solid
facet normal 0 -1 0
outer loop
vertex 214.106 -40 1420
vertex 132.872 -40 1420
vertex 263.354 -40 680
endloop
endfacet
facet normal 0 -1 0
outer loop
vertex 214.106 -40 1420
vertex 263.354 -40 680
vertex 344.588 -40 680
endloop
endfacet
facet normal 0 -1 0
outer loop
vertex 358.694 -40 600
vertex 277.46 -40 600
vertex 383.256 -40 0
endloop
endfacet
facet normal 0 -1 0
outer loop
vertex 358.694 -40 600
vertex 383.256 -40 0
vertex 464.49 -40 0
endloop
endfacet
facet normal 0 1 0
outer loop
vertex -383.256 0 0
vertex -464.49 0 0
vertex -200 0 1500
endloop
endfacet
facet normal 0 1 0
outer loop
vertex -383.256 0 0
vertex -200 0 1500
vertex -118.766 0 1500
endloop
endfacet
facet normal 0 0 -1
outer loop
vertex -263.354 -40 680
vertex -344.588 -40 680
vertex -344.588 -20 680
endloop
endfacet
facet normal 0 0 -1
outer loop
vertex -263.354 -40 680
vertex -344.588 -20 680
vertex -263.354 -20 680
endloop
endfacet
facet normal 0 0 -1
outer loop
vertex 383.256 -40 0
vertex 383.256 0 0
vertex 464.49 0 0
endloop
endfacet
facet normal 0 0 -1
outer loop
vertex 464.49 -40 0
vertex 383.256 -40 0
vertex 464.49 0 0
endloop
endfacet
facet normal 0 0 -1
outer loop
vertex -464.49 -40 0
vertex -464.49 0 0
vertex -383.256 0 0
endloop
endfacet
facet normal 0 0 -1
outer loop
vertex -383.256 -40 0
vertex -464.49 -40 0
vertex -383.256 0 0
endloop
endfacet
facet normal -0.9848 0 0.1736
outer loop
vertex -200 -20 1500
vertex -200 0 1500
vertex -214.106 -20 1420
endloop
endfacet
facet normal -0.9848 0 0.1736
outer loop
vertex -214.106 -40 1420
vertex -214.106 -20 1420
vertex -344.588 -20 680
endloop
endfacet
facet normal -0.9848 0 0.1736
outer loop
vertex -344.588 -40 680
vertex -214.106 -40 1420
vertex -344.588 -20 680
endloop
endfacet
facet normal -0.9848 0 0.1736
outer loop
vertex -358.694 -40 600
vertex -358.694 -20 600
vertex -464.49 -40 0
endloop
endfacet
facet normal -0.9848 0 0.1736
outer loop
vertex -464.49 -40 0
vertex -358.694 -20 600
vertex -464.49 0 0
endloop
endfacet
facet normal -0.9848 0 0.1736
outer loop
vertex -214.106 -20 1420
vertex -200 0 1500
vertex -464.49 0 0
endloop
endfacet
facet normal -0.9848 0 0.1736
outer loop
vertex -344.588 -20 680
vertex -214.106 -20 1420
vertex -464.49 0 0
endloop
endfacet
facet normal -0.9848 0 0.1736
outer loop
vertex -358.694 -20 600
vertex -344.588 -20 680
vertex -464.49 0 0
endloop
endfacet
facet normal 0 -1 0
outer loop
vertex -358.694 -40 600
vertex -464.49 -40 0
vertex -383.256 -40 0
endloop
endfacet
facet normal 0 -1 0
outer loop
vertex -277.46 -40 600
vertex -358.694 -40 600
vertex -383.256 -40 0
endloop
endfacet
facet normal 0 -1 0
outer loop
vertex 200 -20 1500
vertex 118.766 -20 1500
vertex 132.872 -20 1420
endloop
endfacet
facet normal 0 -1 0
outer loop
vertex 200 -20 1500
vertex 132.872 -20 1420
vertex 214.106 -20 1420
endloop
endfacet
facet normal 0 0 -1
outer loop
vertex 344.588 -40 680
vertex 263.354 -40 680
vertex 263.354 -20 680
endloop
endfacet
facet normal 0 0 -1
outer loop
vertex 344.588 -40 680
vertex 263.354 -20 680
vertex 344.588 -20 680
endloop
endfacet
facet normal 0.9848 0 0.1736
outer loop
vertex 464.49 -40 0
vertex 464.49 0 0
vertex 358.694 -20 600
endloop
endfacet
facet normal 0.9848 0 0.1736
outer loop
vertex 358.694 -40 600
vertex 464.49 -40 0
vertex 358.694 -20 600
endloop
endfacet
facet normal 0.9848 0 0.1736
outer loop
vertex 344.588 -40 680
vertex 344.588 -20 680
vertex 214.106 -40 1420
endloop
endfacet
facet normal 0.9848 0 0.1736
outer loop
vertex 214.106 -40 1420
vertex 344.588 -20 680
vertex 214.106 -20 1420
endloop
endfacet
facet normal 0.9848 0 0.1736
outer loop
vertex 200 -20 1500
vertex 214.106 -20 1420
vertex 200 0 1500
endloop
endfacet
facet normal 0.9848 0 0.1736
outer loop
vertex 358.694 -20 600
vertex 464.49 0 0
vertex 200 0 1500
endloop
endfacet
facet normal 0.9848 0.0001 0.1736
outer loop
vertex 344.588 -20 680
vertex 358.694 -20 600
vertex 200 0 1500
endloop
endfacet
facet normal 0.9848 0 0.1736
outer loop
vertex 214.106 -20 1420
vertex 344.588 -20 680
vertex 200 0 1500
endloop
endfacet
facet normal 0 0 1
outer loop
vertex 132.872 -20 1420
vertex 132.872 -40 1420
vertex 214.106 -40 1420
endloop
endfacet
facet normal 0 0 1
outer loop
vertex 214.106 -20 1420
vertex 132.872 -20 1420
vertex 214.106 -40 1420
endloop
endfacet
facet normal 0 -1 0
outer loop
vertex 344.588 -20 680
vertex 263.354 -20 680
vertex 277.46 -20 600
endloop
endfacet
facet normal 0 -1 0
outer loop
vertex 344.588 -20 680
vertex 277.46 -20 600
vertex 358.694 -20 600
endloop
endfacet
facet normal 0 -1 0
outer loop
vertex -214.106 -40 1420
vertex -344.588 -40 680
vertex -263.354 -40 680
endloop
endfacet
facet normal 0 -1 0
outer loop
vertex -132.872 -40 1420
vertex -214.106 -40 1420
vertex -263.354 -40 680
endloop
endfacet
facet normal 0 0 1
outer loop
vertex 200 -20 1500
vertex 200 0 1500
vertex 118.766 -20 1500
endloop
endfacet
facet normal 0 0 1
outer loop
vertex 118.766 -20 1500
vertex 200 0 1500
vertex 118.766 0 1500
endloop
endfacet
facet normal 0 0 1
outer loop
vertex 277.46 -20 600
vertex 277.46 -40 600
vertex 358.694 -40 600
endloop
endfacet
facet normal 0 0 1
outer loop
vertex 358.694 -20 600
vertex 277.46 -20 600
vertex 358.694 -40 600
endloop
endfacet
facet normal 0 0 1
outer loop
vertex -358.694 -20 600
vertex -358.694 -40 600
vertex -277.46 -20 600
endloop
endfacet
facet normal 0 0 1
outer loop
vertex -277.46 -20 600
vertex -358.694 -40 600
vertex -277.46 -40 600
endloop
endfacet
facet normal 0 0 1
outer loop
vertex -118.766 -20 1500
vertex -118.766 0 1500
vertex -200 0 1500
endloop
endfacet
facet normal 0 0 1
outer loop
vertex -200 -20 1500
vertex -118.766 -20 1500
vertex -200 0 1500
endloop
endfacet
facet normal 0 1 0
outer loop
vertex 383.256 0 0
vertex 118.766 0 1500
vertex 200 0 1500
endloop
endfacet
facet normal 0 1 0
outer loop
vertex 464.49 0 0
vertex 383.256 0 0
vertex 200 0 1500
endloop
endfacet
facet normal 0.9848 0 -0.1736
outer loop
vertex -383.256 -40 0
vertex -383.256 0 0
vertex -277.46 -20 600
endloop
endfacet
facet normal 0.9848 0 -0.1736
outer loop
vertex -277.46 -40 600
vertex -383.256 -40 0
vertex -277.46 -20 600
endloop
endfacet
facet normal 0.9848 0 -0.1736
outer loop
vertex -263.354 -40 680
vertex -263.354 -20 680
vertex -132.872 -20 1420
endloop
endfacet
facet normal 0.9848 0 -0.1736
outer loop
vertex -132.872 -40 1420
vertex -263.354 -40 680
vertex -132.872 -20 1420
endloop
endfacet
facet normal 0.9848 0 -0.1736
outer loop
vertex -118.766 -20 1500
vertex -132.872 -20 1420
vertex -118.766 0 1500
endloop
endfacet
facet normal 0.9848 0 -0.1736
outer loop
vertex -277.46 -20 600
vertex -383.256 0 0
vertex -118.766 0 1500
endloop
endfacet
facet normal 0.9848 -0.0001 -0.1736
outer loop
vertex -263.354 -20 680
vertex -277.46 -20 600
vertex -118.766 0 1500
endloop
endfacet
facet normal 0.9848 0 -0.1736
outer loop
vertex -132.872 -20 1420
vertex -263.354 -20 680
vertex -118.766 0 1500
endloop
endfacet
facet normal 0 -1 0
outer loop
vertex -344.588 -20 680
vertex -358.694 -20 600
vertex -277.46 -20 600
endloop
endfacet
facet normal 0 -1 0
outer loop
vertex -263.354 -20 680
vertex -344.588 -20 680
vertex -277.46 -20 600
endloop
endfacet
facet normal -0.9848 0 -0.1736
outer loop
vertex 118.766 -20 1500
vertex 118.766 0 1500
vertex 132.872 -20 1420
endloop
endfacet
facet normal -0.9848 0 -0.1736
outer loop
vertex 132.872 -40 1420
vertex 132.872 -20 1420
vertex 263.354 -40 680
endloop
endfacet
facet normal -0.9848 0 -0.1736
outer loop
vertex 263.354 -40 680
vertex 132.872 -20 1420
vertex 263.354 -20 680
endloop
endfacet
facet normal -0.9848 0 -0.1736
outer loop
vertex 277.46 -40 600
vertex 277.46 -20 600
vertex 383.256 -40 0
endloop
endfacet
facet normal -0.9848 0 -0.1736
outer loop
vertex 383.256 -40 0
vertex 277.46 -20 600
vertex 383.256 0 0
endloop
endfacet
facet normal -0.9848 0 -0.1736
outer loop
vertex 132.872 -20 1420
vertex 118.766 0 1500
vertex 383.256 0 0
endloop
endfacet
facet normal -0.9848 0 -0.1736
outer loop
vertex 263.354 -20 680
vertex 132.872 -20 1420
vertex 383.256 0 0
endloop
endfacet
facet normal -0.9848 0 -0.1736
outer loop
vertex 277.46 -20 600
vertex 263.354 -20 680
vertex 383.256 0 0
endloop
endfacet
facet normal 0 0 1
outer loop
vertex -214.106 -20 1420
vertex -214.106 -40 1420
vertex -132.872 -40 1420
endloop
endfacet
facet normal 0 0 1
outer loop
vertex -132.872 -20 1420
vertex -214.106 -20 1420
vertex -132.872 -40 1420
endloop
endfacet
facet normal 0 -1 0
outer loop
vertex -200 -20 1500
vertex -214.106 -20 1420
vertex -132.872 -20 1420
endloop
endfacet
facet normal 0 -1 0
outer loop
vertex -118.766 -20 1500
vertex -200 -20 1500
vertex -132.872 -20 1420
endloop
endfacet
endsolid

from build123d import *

# Parameters (mm, degrees)
F2_DEPTH = 40
F3_W     = 95.3402874075
F3_H     = 80
F4_DEPTH = 20
F5_DEPTH = 20
F6_W     = 95.3402874075
F6_H     = 80
F7_DEPTH = 20


with BuildPart() as f2:
    # F1 (on Front) → F2 (new body)
    with BuildSketch(Plane.XZ):
        Polygon((-118.7658710491, 1500), (-200, 1500), (-464.4904710627, 0), (-383.2563421118, 0), align=None)
    extrude(amount=F2_DEPTH)

    # F3 (on face) → F4 (cut)
    with BuildSketch(Plane.XZ.offset(40)):
        Polygon((-118.7658710491, 1500), (-200, 1500), (-214.1061584567, 1420), (-132.8720295058, 1420), align=None)
        with Locations((-311.0241389339, 640)):
            Rectangle(F3_W, F3_H)
    extrude(amount=-F4_DEPTH, mode=Mode.SUBTRACT)

    # F3 (on face) → F5 (cut)
    with BuildSketch(Plane.XZ.offset(40)):
        Polygon((-118.7658710491, 1500), (-200, 1500), (-214.1061584567, 1420), (-132.8720295058, 1420), align=None)
        with Locations((-311.0241389339, 640)):
            Rectangle(F3_W, F3_H)
    extrude(amount=-F5_DEPTH, mode=Mode.SUBTRACT)


with BuildPart() as f2b:
    # F1 (on Front) → F2, piece 2 (new body)
    with BuildSketch(Plane.XZ):
        Polygon((118.7658710491, 1500), (383.2563421118, 0), (464.4904710627, 0), (200, 1500), align=None)
    extrude(amount=F2_DEPTH)

    # F6 (on face) → F7 (cut)
    with BuildSketch(Plane.XZ.offset(40)):
        with Locations((166.4360147529, 1460)):
            Rectangle(F6_W, F6_H)
        with Locations((311.0241389339, 640)):
            Rectangle(F6_W, F6_H)
    extrude(amount=-F7_DEPTH, mode=Mode.SUBTRACT)


solid = Compound([f2.part, f2b.part])
